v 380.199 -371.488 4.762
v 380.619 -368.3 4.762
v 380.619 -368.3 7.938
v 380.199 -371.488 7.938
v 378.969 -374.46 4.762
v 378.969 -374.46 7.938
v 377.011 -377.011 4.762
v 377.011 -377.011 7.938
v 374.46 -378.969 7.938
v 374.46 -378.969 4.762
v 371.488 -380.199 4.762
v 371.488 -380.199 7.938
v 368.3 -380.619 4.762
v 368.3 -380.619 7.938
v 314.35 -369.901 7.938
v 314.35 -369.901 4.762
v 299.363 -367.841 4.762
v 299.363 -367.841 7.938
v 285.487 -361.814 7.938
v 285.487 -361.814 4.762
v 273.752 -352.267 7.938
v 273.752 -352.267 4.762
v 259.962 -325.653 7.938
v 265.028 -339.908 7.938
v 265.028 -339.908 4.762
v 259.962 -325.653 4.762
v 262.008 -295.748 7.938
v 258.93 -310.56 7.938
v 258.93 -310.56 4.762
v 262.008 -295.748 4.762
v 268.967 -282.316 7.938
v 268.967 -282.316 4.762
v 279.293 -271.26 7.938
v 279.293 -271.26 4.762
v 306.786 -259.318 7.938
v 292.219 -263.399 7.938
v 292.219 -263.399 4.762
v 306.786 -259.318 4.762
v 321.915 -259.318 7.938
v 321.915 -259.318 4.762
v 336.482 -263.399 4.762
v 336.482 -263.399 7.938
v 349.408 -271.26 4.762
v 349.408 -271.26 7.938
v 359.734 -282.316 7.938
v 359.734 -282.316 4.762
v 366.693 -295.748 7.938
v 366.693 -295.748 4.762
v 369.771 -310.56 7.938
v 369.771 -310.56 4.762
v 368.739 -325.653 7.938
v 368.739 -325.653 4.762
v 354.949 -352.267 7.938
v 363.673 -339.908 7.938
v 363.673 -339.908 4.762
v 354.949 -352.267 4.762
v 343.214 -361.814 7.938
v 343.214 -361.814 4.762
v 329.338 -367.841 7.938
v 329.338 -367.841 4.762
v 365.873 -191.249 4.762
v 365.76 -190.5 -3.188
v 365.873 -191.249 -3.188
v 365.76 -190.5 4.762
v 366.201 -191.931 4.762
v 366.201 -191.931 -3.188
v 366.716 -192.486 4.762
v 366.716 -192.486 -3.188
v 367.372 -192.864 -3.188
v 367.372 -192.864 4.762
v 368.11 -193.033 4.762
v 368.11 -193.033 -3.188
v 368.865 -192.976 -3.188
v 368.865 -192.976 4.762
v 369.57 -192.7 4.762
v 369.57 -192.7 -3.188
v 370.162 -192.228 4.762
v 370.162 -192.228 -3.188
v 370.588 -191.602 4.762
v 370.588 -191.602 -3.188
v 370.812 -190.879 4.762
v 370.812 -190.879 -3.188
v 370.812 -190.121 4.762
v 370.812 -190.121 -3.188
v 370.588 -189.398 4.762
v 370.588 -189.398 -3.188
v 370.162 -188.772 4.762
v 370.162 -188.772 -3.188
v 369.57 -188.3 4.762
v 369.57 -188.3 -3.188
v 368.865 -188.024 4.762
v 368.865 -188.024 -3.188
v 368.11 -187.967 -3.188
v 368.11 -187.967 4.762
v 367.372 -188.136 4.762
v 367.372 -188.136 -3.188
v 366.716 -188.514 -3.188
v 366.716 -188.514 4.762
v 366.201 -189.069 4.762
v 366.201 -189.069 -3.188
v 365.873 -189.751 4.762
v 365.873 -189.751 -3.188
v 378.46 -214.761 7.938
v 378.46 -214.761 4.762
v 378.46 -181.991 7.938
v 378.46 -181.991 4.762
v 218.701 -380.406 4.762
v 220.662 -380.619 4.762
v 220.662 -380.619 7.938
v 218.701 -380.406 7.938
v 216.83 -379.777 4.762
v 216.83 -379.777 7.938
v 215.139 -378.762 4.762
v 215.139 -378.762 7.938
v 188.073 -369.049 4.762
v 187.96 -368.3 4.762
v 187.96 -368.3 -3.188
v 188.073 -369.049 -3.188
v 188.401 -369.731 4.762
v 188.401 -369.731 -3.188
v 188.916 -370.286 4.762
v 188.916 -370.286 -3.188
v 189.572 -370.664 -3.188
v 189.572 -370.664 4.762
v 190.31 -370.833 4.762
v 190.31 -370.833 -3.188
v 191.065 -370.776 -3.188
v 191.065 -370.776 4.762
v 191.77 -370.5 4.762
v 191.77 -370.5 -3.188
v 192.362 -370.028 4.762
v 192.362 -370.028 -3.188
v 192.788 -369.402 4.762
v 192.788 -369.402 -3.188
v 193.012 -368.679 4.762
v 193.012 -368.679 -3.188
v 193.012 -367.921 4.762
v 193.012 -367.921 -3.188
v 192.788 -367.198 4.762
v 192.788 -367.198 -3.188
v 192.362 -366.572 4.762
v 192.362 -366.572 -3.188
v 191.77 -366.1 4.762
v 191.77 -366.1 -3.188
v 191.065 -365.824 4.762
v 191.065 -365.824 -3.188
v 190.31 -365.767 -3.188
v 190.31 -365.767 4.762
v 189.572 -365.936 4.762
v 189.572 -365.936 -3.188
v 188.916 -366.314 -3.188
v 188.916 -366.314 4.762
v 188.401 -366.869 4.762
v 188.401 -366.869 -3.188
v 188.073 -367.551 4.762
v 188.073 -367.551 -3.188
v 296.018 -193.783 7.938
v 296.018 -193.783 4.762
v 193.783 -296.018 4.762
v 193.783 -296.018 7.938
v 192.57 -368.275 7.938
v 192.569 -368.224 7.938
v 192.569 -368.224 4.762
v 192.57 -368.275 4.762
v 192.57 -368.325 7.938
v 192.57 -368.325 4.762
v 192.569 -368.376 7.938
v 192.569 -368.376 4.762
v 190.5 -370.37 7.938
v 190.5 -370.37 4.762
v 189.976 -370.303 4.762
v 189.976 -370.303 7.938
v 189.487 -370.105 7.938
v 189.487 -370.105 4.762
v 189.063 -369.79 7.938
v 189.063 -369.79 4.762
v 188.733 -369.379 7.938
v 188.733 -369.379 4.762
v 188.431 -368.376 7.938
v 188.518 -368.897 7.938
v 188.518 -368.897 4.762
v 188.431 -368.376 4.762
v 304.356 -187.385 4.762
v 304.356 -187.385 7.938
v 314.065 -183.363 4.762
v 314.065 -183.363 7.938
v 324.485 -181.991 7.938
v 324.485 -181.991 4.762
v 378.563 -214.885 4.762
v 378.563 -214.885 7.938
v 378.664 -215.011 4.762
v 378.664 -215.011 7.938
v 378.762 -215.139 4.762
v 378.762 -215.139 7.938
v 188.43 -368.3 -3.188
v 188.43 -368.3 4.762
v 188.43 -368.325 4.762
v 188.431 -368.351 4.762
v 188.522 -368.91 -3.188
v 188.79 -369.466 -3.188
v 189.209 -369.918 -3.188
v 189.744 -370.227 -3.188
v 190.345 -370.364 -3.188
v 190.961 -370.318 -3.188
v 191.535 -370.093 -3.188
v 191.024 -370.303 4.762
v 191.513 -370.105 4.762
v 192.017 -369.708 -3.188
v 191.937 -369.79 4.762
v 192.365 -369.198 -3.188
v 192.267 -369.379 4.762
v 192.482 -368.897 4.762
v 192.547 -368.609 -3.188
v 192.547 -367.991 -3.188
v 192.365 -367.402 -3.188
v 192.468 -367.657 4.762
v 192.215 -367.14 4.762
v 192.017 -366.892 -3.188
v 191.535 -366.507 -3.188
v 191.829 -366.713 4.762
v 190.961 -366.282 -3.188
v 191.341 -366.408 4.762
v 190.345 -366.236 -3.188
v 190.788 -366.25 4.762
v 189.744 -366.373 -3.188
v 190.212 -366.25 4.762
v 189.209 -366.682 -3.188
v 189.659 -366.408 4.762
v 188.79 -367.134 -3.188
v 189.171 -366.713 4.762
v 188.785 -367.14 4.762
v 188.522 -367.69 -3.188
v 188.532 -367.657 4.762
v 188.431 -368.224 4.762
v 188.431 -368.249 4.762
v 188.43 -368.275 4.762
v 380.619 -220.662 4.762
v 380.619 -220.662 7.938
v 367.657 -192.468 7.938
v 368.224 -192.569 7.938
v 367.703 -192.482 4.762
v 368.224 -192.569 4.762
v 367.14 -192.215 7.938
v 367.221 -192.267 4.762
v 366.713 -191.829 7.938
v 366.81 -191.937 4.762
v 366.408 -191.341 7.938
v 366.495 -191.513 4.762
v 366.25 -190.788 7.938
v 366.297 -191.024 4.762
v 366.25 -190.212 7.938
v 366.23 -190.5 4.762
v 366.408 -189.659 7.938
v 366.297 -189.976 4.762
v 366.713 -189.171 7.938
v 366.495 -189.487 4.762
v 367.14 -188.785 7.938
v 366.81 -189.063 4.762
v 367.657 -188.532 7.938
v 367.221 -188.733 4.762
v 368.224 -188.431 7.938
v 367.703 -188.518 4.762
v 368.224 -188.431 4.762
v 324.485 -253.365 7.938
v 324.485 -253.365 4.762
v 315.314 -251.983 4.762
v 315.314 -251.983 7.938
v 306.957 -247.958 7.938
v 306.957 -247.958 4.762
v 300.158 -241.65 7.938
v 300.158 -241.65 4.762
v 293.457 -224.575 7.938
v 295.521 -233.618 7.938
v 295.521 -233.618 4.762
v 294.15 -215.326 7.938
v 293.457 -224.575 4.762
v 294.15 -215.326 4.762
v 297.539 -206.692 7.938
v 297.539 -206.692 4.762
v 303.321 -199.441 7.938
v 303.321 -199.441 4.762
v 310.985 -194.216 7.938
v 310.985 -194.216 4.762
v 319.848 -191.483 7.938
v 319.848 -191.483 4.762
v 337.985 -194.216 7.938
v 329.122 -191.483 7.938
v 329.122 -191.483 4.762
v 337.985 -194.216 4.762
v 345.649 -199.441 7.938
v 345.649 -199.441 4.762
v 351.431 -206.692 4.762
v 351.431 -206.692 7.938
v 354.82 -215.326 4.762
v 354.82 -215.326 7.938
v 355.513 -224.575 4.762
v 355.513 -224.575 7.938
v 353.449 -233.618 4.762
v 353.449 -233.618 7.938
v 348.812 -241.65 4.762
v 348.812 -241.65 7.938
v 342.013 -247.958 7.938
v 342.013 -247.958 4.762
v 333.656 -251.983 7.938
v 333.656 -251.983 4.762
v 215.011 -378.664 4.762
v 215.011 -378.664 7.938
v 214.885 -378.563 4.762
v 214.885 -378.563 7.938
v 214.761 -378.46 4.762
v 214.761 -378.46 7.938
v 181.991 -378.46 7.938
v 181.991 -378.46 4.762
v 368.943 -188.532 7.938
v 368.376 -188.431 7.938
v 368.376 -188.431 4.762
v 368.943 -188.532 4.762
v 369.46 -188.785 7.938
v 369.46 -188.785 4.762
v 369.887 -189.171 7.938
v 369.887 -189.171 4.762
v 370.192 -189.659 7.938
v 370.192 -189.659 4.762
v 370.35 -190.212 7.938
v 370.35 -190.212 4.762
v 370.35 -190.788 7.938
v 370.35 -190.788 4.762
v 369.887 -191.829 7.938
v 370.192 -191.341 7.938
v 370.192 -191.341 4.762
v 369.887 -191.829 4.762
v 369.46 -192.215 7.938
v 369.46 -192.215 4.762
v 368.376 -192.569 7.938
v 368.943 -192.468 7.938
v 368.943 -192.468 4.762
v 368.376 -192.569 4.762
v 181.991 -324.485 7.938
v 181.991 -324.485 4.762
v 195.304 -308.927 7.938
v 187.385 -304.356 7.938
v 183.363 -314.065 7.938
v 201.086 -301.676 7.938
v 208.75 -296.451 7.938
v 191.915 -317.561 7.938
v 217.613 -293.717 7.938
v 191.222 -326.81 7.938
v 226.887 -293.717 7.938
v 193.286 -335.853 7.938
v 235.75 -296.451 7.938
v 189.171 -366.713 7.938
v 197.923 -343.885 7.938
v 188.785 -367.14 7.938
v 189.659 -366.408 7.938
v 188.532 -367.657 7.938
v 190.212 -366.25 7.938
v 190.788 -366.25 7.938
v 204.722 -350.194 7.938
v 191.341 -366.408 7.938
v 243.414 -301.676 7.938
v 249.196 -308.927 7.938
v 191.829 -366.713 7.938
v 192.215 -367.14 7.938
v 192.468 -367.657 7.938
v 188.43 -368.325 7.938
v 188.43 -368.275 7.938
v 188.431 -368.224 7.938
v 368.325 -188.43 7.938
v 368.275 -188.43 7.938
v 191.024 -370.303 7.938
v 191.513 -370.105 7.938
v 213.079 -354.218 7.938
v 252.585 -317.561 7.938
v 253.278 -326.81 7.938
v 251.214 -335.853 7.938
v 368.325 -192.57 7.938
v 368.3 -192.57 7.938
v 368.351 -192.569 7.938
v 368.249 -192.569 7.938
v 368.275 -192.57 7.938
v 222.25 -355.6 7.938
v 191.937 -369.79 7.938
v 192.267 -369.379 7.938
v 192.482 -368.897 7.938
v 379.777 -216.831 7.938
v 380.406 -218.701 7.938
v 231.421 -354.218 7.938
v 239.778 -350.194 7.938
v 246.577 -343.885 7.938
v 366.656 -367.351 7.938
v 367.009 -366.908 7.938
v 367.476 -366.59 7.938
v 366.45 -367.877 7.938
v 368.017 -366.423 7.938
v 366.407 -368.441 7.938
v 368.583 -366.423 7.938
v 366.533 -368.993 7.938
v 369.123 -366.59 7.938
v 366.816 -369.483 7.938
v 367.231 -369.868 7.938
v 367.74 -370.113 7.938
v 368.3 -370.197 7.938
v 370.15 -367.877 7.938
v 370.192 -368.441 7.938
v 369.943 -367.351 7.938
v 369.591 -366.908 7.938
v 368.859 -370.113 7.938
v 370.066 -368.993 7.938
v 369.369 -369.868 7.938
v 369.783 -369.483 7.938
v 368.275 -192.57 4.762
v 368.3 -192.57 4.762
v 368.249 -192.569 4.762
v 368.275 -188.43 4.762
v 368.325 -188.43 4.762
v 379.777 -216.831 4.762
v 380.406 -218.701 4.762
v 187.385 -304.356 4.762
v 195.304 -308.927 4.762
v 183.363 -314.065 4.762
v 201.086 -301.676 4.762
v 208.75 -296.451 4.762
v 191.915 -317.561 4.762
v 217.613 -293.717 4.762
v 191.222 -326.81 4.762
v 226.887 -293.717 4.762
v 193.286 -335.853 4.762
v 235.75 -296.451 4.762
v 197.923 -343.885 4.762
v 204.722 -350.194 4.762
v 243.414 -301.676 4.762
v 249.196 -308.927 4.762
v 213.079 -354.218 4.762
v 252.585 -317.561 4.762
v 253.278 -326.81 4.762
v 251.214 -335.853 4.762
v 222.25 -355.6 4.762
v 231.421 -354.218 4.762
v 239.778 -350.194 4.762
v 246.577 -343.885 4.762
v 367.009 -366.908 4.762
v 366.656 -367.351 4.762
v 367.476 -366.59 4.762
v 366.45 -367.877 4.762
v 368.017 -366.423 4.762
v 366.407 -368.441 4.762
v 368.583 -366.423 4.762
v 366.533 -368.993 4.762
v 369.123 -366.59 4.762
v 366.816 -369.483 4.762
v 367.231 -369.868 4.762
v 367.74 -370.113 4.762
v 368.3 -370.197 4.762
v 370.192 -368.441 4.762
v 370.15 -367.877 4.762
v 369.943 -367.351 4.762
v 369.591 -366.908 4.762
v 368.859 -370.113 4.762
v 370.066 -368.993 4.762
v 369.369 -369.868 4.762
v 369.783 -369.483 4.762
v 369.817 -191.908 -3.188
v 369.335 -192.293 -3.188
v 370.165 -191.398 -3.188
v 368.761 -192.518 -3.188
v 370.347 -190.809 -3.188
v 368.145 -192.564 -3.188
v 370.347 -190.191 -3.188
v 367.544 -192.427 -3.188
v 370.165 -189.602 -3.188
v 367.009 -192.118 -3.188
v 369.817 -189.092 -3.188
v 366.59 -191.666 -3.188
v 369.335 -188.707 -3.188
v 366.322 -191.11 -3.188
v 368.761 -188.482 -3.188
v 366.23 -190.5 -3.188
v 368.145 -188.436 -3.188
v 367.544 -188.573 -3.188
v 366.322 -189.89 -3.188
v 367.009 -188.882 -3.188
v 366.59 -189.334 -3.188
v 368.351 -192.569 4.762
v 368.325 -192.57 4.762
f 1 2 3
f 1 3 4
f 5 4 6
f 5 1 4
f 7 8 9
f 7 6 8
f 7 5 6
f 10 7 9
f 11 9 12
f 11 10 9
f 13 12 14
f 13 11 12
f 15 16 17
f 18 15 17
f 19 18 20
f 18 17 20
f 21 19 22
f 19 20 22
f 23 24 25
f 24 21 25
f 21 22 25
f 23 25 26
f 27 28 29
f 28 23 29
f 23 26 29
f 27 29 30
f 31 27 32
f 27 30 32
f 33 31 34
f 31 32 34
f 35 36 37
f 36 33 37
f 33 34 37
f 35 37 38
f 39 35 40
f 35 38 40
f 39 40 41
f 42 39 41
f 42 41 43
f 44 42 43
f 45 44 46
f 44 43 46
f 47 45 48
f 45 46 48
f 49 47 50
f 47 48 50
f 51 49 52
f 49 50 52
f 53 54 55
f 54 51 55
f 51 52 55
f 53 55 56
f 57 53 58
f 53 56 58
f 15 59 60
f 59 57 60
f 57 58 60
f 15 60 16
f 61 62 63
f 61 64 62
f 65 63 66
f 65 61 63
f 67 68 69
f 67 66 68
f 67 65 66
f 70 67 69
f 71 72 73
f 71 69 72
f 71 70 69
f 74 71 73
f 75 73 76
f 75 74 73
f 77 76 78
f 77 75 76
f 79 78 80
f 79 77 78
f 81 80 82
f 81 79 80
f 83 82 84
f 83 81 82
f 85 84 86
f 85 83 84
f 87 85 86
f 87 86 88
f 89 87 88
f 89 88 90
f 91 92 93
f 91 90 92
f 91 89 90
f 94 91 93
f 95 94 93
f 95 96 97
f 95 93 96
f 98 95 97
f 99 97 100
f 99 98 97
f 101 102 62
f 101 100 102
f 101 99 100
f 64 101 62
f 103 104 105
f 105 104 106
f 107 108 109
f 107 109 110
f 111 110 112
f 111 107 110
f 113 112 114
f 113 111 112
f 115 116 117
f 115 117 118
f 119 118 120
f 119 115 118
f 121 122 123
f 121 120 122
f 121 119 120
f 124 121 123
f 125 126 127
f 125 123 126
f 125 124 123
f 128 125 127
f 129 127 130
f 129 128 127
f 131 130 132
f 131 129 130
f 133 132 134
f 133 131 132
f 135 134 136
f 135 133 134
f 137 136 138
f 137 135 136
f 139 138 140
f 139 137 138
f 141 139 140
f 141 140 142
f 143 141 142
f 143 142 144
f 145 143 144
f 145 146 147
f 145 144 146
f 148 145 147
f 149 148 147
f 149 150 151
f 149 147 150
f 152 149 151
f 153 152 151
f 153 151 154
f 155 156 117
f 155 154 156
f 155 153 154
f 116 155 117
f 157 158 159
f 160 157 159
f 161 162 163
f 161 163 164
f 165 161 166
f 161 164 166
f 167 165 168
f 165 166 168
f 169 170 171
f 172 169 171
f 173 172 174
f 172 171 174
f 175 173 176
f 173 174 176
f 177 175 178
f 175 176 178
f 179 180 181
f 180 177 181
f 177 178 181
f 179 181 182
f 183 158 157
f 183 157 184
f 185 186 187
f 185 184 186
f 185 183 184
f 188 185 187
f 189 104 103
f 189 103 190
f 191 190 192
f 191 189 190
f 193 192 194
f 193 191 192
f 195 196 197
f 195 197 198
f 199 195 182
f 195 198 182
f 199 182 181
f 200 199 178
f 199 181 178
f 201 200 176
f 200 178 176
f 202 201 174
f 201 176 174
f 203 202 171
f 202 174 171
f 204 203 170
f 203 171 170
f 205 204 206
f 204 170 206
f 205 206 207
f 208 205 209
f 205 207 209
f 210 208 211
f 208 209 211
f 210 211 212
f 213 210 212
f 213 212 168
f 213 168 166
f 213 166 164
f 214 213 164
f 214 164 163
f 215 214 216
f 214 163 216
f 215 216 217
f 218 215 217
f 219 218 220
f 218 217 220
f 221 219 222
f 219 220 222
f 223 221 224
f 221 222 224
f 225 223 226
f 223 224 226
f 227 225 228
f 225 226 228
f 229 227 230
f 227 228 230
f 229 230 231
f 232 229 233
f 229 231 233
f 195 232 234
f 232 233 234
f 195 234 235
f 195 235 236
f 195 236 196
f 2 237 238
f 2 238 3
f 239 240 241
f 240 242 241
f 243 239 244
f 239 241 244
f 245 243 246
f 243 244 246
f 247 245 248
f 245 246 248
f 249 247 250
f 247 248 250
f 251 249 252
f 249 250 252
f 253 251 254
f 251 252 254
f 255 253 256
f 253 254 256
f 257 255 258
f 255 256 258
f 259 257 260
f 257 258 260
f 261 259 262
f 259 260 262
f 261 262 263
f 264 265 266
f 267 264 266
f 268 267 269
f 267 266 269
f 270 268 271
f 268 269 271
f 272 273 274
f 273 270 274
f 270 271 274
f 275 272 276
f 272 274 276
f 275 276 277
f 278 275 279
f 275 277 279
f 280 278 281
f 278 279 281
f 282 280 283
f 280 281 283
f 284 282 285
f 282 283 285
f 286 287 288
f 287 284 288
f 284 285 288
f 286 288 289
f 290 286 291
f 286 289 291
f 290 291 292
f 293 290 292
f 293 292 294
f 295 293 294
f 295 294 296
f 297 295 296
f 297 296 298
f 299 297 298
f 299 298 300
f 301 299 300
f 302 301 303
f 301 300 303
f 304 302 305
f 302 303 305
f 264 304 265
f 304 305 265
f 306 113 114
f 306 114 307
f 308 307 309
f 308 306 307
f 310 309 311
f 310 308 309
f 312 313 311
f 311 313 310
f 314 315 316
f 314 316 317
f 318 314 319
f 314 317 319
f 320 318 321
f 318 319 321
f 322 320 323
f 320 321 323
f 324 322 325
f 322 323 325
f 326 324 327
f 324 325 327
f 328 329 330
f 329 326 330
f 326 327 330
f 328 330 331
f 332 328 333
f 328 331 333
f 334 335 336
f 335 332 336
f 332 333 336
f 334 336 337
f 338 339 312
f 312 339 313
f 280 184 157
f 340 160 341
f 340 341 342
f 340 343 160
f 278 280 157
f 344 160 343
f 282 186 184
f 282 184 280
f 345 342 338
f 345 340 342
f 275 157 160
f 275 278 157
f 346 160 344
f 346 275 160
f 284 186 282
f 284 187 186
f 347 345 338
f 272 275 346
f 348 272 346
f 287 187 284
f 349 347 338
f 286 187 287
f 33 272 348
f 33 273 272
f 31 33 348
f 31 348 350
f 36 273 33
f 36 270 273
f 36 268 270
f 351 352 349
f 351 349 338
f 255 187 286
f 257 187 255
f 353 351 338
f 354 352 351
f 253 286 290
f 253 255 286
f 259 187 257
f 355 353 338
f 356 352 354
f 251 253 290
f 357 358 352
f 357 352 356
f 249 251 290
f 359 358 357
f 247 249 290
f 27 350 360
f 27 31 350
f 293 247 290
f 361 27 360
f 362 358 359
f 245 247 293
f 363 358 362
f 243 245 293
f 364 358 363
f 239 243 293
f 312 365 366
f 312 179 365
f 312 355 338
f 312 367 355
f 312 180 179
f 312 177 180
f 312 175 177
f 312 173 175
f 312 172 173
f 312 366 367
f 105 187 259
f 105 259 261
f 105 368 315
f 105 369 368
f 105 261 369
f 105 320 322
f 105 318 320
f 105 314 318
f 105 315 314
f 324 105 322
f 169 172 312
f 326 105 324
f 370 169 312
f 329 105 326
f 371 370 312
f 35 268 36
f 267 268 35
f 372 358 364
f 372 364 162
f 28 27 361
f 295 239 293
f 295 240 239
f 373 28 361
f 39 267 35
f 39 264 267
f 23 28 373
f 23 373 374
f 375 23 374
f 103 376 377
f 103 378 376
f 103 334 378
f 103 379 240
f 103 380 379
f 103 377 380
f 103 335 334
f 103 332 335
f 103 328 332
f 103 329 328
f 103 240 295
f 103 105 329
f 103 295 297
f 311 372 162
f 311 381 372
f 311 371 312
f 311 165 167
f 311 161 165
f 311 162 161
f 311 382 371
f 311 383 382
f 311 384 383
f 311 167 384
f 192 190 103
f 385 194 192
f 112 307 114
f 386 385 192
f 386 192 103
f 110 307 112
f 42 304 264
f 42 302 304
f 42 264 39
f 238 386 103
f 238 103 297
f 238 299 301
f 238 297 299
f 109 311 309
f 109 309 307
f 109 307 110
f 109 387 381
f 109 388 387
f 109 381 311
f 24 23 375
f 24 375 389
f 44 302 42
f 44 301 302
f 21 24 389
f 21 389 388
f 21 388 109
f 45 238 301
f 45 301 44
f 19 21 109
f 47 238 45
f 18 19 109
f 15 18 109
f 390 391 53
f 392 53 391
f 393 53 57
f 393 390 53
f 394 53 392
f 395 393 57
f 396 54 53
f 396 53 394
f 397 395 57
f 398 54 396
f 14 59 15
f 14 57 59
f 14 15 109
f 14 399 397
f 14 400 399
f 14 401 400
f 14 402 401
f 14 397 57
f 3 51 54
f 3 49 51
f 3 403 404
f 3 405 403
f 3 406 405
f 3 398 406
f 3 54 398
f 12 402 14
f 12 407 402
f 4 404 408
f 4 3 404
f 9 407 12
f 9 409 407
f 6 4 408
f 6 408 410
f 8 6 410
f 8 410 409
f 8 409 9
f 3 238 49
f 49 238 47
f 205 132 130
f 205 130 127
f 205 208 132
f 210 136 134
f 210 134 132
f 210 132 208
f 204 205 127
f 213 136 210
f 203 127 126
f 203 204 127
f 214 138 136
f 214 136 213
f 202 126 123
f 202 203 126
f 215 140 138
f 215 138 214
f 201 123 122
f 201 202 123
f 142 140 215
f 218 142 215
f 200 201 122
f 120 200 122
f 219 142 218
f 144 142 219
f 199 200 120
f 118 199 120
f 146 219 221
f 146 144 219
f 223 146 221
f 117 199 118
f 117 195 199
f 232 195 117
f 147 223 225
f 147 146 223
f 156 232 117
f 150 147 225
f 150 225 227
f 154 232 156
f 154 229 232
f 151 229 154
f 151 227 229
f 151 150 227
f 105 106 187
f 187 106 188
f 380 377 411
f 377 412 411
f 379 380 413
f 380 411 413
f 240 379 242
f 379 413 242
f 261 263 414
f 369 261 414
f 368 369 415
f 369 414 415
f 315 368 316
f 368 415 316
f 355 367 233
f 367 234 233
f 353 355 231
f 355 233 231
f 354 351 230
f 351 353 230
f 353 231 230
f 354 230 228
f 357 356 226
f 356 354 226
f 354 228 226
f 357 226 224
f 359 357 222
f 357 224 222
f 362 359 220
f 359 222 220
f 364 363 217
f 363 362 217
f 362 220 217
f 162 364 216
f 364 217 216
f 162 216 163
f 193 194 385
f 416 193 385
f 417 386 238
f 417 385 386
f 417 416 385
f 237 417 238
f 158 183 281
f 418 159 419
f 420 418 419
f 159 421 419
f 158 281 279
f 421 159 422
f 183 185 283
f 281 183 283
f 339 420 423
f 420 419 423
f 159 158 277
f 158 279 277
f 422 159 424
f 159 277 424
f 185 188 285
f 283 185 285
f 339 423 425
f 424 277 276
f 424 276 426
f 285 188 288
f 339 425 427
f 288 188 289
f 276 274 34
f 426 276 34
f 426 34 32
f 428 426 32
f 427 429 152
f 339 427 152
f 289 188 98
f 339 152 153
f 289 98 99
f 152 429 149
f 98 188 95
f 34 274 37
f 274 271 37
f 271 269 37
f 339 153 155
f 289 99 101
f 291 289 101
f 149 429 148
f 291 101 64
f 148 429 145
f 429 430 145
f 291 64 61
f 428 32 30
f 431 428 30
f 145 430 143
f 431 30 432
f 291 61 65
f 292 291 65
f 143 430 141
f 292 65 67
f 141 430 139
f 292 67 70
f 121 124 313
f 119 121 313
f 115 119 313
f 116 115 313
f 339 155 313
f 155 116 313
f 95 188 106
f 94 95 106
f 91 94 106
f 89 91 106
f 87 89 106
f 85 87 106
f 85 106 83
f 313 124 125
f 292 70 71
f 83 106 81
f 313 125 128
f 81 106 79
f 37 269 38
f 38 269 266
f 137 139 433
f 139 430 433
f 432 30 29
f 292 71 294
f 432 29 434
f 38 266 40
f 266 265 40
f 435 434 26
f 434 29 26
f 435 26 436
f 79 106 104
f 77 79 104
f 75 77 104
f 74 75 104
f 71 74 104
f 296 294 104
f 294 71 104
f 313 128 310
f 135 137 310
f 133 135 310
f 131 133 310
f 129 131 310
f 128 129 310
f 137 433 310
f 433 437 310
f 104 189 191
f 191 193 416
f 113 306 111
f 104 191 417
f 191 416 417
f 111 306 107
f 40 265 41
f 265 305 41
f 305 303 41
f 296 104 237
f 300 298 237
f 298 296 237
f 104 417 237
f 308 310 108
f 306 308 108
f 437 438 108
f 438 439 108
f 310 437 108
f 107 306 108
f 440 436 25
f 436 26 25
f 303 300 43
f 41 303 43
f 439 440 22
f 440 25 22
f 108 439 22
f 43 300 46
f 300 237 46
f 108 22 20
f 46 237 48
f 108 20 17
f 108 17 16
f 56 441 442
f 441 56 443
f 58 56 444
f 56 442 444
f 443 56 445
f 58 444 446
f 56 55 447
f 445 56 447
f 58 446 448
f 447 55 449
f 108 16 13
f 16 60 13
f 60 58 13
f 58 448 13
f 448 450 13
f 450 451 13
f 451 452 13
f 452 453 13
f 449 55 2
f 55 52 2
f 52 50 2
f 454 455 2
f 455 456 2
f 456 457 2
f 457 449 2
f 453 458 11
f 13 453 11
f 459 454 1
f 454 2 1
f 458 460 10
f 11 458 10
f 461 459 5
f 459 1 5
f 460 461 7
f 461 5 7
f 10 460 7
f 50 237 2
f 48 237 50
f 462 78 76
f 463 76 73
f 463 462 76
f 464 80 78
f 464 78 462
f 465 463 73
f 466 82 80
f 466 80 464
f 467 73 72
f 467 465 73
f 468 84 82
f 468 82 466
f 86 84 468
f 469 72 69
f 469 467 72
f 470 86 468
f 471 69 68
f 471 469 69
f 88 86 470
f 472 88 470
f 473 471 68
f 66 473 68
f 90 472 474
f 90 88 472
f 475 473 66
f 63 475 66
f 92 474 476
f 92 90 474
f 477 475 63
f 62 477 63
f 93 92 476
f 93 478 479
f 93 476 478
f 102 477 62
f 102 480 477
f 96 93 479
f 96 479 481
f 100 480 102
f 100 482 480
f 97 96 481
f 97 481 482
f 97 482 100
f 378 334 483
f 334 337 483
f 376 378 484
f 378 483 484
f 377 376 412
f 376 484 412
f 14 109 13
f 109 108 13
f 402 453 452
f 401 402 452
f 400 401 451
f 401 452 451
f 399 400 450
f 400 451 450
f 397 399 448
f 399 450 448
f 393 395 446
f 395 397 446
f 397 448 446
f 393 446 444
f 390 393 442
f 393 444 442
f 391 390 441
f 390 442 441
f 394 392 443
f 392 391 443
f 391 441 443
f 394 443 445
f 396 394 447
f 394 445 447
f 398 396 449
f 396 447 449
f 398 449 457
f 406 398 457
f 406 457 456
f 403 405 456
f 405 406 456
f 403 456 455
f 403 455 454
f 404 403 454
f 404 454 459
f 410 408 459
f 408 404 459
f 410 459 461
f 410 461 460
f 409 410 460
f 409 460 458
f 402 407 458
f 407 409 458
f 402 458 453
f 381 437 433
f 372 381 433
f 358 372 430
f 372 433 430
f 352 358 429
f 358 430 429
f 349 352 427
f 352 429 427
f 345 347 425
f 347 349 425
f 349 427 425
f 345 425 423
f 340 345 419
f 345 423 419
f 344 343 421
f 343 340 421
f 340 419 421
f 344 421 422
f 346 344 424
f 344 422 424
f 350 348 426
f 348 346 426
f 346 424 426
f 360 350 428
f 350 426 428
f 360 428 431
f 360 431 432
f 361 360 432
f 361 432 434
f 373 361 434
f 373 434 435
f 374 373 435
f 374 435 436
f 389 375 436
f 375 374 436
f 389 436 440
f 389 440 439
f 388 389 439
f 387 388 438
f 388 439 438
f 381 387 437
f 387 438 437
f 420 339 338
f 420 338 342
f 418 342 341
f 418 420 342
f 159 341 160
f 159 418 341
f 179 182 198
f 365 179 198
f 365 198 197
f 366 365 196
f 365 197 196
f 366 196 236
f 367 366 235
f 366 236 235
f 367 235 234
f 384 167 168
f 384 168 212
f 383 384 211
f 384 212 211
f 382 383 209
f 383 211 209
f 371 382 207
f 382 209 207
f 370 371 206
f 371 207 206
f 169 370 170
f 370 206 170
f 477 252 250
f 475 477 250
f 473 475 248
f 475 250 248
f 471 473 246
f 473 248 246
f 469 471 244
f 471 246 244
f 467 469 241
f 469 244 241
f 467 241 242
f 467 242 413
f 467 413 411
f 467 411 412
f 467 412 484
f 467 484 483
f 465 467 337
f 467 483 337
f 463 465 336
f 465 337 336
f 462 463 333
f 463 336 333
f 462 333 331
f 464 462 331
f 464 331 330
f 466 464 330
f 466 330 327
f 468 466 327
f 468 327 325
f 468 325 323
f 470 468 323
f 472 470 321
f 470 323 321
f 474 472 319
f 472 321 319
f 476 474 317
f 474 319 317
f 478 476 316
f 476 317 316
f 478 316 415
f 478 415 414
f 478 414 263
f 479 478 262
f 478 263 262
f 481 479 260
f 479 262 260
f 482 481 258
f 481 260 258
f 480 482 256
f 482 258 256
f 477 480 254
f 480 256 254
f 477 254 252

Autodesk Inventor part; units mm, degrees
ref_plane "YZ Plane" through (0, 0, 0) normal (1, 0, 0) x (0, 1, 0)
ref_plane "XZ Plane" through (0, 0, 0) normal (0, 1, 0) x (-1, 0, 0)
ref_plane "XY Plane" through (0, 0, 0) normal (0, 0, 1) x (1, 0, 0)
ref_plane "Work Plane1" through (368.3, -368.3, 4.7625) normal (0, 0, 1) x (0, -1, 0)
sketch "Sketch1" plane through (368.3, -368.3, 4.7625) normal (0, 0, 1) x (0, -1, 0)
  spline S0 degree 3 number of poles 884
  arc A0 (-72.2824, -174.5174) -> (-43.815, -186.309) centre (-43.815, -146.05) ccw
  line L0 (-43.815, -186.309) -> (12.7, -186.309)
  line L1 (-174.5174, -72.2824) -> (-72.2824, -174.5174)
  arc A1 (-186.309, -43.815) -> (-174.5174, -72.2824) centre (-146.05, -43.815) ccw
  line L2 (-186.309, 12.7) -> (-186.309, -43.815)
  line L3 (-88.9, 10.16) -> (-647.7, 10.16)
  line L4 (10.16, -647.7) -> (10.16, -88.9)
  circle A2 centre (-43.815, -146.05) radius 31.1151
  circle A3 centre (-146.05, -43.815) radius 31.115
  line L5 (0, 0) -> (-123.3999, -123.3999) construction
  line L6 (0, -186.309) -> (0, 0) construction
  line L7 (0, 0) -> (-186.309, 0) construction
  spline S1 degree 3 number of poles 404 construction
  circle A4 centre (-53.9492, -53.9495) radius 55.5504
  line L8 (12.319, -147.6375) -> (12.319, -128.3493)
  line L9 (12.319, -125.6507) -> (12.319, -102.9776)
  line L10 (12.319, -748.919) -> (12.319, 12.7)
  line L11 (0, 12.319) -> (-53.975, 12.319)
  line L12 (-61.0927, 12.319) -> (-100.199, 12.319)
  line L13 (-147.6375, 12.319) -> (0, 12.319)
  arc A5 (12.319, 0) -> (0, 12.319) centre (0, 0) ccw
  arc A6 (-147.6375, 12.319) -> (-153.1614, 10.462) centre (-147.6375, 3.175) ccw
  arc A7 (-147.6375, 12.319) -> (-156.7815, 3.175) centre (-147.6375, 3.175) ccw
  line L14 (-156.7815, 3.175) -> (-156.7815, -3.175)
  arc A8 (-156.7815, -3.175) -> (-154.0017, -9.7408) centre (-147.6375, -3.175) ccw
  arc A9 (-156.7815, -3.175) -> (-147.6375, -12.319) centre (-147.6375, -3.175) ccw
  line L15 (-147.6375, -12.7) -> (-147.6375, -12.319)
  arc A10 (10.462, -153.1614) -> (12.319, -147.6375) centre (3.175, -147.6375) ccw
  arc A11 (3.175, -156.7815) -> (12.319, -147.6375) centre (3.175, -147.6375) ccw
  line L16 (-3.175, -156.7815) -> (3.175, -156.7815)
  arc A12 (-9.7408, -154.0017) -> (-3.175, -156.7815) centre (-3.175, -147.6375) ccw
  arc A13 (-12.319, -147.6375) -> (-3.175, -156.7815) centre (-3.175, -147.6375) ccw
  line L17 (-12.319, -147.6375) -> (-12.7, -147.6375)
  arc A14 (-175.7313, 0.0762) -> (-179.8687, 0.0762) centre (-177.8, 0) ccw
  arc A15 (-179.8687, -0.0762) -> (-175.7313, -0.0762) centre (-177.8, 0) ccw
  arc A16 (-0.0762, -175.7313) -> (-0.0762, -179.8687) centre (0, -177.8) ccw
  arc A17 (0.0762, -179.8687) -> (0.0762, -175.7313) centre (0, -177.8) ccw
  line L18 (-147.6375, 12.319) -> (-186.309, 12.319)
  line L19 (-147.6375, 12.319) -> (0, 12.319)
  line L20 (-186.309, 12.319) -> (-186.309, -43.815)
  line L21 (12.319, -186.309) -> (12.319, 0)
  line L22 (-174.5174, -72.2824) -> (-72.2824, -174.5174)
  line L23 (12.319, -186.309) -> (-43.815, -186.309)
  arc A18 (-72.2824, -174.5174) -> (-43.815, -186.309) centre (-43.815, -146.05) ccw
  arc A19 (-186.309, -43.815) -> (-174.5174, -72.2824) centre (-146.05, -43.815) ccw
  arc A20 (12.319, 0) -> (-0.0762, 12.319) centre (-0.0004, -0.0002) ccw
  circle A21 centre (-0.0004, -0.0002) radius 1.8977
  circle A22 centre (-177.8, 0) radius 2.0701
  circle A23 centre (0, -177.8) radius 2.0701
  point P0 (-368.3, -368.3)
  point P1 (-153.5386, 10.16)
  point P2 (-186.309, 10.16)
  point P3 (10.16, -186.309)
  point P4 (10.16, -153.5386)
  point P5 (7.669, 9.6408)
  point P6 (-179.8687, -0.0762)
  point P7 (-179.8687, 0.0762)
  point P8 (-175.7313, 0.0762)
  point P9 (-175.7313, -0.0762)
  point P10 (0.0762, -179.8687)
  point P11 (-0.0762, -179.8687)
  point P12 (-0.0762, -175.7313)
  point P13 (0.0762, -175.7313)
extrude "Extrusion1" add sketch "Sketch1" along normal blind 3.175 contours L1 A1 L2 L3 A7 A6 L13 L12 L11 A5 L10 L9 L8 A10 A11 L4 L0 A0
sketch "Sketch2" plane through (368.3, -368.3, 4.7625) normal (0, 0, -1) x (-1, 0, 0)
  circle A0 centre (177.8, 0) radius 2.0701 projected
  circle A1 centre (177.8, 0) radius 2.0701
  circle A2 centre (0, 177.8) radius 2.0701 projected
  circle A3 centre (0, 177.8) radius 2.0701
  circle A4 centre (177.8, 0) radius 2.54
  circle A5 centre (0, 177.8) radius 2.54
  point P0 (368.3, 368.3)
  dimension "d2" = 5.08
  dimension "d3" = 5.08
extrude "Extrusion2" add sketch "Sketch2" along normal blind 7.9502
properties part number "swerve protector"
